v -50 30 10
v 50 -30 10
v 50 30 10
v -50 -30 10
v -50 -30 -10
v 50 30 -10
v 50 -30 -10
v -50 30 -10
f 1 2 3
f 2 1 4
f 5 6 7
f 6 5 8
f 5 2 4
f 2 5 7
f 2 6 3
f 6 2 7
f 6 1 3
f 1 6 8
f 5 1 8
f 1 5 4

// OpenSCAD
// Golden (a) — plain 100x60x20mm block, centred at the origin. No cuts: genus 0,
// volume exactly 100*60*20 = 120000 mm^3. Baseline for the mesh gate's "clean part"
// path (loadable, watertight, correct bbox/volume/body-count, zero holes).
$fn = 64;

length = 100;
width  = 60;
height = 20;

cube([length, width, height], center = true);
